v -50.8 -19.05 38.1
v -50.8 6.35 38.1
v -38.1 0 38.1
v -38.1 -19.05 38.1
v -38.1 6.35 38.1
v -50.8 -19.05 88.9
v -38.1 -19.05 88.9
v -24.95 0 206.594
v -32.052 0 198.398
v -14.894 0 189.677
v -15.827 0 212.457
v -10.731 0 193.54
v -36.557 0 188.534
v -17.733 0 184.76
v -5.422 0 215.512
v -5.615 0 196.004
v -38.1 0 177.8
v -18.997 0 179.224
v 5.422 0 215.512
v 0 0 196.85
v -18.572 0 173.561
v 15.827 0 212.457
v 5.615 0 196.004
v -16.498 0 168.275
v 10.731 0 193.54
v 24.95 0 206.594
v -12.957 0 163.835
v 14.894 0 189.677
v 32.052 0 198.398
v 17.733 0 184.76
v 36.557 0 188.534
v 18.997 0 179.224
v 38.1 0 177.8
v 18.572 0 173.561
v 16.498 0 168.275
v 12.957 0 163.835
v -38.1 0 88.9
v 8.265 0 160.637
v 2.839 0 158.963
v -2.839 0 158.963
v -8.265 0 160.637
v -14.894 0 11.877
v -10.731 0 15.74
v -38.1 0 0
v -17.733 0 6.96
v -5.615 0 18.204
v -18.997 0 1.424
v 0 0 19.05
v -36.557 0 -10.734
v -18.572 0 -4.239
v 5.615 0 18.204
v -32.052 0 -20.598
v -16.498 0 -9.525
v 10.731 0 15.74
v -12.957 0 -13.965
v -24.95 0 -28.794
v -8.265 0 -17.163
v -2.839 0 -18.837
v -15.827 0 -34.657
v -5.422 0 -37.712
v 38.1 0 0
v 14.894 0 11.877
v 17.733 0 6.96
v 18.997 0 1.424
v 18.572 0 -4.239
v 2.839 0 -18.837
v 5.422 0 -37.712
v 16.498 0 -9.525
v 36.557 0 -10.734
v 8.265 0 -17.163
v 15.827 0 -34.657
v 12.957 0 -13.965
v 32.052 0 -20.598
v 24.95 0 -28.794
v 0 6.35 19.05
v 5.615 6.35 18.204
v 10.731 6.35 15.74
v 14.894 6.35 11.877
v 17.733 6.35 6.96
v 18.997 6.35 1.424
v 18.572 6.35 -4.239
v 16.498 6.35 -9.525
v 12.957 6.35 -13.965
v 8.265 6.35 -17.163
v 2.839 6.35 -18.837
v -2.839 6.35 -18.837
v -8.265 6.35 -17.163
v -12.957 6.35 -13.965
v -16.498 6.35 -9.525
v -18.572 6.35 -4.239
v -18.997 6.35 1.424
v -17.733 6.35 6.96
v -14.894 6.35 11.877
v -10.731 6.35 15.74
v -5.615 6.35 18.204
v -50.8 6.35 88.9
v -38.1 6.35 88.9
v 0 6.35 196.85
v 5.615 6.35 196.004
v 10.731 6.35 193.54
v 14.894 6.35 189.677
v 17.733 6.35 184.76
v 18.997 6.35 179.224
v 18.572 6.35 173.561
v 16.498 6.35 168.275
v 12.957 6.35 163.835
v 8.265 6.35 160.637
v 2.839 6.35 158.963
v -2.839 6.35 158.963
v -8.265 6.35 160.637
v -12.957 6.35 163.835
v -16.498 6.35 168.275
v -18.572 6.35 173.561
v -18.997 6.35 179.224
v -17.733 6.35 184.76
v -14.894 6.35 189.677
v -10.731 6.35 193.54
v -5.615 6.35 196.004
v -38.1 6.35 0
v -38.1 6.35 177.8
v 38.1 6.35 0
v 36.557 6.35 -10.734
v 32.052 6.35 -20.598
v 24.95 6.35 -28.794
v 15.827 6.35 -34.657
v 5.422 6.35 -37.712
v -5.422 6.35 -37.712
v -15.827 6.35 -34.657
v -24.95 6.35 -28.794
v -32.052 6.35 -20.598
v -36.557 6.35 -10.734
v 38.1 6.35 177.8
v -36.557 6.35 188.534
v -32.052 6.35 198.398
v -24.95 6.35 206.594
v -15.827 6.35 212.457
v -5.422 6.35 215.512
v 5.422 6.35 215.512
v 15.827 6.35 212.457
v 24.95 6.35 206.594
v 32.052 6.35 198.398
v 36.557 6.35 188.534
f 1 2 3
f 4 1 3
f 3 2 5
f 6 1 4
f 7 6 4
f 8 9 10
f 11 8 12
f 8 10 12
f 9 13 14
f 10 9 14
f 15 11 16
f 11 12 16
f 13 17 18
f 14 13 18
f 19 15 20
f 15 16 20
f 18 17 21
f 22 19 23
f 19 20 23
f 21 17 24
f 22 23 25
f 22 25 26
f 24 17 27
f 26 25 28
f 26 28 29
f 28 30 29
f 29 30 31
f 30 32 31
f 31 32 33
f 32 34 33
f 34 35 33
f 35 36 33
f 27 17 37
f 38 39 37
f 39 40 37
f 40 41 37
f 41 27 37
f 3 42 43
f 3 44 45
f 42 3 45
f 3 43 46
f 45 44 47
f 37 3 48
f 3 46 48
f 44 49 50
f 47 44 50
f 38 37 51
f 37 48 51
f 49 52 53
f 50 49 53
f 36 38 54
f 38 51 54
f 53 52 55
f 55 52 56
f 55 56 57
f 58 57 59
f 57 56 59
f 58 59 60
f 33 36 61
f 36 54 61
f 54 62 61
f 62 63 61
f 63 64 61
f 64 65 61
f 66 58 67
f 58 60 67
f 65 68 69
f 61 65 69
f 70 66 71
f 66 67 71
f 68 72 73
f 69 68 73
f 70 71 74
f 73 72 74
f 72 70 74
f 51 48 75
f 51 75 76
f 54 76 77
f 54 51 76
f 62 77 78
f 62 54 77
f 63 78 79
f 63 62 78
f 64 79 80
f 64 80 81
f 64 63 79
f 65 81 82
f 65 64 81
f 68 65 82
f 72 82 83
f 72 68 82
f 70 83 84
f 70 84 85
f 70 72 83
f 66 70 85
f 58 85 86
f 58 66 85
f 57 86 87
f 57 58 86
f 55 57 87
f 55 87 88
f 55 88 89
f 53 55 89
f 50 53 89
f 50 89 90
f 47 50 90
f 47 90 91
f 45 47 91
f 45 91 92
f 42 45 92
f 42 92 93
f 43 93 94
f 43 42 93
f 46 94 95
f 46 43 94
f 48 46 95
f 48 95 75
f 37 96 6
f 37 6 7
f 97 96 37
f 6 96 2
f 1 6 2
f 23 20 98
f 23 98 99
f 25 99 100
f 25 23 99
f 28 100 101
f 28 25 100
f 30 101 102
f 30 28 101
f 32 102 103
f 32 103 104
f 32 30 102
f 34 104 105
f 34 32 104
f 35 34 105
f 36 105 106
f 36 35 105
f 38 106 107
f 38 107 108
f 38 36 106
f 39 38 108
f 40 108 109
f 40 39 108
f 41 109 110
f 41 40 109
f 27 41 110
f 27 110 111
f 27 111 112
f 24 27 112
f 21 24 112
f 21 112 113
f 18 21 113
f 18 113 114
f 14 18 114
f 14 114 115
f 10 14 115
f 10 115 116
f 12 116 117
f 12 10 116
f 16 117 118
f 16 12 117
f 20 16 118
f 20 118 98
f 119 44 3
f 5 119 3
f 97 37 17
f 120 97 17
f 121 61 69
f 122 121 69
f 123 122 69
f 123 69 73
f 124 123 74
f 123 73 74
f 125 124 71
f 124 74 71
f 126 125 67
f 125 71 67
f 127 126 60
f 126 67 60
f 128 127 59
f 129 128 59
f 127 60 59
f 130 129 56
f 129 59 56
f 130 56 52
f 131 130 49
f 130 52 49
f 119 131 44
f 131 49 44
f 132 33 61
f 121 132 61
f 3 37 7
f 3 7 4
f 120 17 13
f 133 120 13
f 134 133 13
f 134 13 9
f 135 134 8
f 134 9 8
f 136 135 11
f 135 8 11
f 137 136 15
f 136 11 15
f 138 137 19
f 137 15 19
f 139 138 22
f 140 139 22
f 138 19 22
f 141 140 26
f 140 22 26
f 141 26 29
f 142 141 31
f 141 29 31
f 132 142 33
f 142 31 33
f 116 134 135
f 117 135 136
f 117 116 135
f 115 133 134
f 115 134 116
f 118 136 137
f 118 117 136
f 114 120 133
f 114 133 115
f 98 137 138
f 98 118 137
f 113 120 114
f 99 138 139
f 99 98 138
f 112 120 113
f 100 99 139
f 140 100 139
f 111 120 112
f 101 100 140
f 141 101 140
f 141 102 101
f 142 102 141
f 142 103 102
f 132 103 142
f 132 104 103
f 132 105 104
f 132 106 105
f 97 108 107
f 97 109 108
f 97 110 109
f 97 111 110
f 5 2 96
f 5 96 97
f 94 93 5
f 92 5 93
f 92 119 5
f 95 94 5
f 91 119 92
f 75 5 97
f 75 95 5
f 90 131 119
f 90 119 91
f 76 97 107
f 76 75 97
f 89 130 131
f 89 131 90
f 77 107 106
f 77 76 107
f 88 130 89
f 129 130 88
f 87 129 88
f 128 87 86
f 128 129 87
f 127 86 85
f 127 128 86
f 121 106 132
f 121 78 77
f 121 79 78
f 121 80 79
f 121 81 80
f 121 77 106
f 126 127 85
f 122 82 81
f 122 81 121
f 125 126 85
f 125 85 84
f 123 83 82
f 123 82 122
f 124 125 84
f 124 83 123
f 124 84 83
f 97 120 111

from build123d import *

# Parameters (mm, degrees)
SKETCH1_R           = 19.05
BOSS_EXTRUDE1_DEPTH = 6.35
SKETCH2_W           = 12.7
SKETCH2_H           = 50.8
BOSS_EXTRUDE4_DEPTH = 25.4


with BuildPart() as part:
    # Sketch1 → Boss-Extrude1 (new body)
    with BuildSketch(Plane(origin=(0, 0, 0), x_dir=(1, 0, 0), z_dir=(0, 1, 0))):
        with BuildLine():
            Line((-38.1, 0), (-38.1, -177.8))
            ThreePointArc((-38.1, -177.8), (0, -215.9), (38.1, -177.8))
            Line((38.1, -177.8), (38.1, 0))
            ThreePointArc((38.1, 0), (0, 38.1), (-38.1, 0))
        make_face()
        with Locations(Location((0, 0, 0), (0, 0, 270))):
            Circle(SKETCH1_R, mode=Mode.SUBTRACT)
        with Locations(Location((0, -177.8, 0), (0, 0, 270))):
            Circle(SKETCH1_R, mode=Mode.SUBTRACT)
    extrude(amount=BOSS_EXTRUDE1_DEPTH)

    # Sketch2 → Boss-Extrude4 (add)
    with BuildSketch(Plane(origin=(0, 6.35, 0), x_dir=(1, 0, 0), z_dir=(0, 1, 0))):
        with Locations((-44.45, -63.5)):
            Rectangle(SKETCH2_W, SKETCH2_H)
    extrude(amount=-BOSS_EXTRUDE4_DEPTH)


solid = part.part
